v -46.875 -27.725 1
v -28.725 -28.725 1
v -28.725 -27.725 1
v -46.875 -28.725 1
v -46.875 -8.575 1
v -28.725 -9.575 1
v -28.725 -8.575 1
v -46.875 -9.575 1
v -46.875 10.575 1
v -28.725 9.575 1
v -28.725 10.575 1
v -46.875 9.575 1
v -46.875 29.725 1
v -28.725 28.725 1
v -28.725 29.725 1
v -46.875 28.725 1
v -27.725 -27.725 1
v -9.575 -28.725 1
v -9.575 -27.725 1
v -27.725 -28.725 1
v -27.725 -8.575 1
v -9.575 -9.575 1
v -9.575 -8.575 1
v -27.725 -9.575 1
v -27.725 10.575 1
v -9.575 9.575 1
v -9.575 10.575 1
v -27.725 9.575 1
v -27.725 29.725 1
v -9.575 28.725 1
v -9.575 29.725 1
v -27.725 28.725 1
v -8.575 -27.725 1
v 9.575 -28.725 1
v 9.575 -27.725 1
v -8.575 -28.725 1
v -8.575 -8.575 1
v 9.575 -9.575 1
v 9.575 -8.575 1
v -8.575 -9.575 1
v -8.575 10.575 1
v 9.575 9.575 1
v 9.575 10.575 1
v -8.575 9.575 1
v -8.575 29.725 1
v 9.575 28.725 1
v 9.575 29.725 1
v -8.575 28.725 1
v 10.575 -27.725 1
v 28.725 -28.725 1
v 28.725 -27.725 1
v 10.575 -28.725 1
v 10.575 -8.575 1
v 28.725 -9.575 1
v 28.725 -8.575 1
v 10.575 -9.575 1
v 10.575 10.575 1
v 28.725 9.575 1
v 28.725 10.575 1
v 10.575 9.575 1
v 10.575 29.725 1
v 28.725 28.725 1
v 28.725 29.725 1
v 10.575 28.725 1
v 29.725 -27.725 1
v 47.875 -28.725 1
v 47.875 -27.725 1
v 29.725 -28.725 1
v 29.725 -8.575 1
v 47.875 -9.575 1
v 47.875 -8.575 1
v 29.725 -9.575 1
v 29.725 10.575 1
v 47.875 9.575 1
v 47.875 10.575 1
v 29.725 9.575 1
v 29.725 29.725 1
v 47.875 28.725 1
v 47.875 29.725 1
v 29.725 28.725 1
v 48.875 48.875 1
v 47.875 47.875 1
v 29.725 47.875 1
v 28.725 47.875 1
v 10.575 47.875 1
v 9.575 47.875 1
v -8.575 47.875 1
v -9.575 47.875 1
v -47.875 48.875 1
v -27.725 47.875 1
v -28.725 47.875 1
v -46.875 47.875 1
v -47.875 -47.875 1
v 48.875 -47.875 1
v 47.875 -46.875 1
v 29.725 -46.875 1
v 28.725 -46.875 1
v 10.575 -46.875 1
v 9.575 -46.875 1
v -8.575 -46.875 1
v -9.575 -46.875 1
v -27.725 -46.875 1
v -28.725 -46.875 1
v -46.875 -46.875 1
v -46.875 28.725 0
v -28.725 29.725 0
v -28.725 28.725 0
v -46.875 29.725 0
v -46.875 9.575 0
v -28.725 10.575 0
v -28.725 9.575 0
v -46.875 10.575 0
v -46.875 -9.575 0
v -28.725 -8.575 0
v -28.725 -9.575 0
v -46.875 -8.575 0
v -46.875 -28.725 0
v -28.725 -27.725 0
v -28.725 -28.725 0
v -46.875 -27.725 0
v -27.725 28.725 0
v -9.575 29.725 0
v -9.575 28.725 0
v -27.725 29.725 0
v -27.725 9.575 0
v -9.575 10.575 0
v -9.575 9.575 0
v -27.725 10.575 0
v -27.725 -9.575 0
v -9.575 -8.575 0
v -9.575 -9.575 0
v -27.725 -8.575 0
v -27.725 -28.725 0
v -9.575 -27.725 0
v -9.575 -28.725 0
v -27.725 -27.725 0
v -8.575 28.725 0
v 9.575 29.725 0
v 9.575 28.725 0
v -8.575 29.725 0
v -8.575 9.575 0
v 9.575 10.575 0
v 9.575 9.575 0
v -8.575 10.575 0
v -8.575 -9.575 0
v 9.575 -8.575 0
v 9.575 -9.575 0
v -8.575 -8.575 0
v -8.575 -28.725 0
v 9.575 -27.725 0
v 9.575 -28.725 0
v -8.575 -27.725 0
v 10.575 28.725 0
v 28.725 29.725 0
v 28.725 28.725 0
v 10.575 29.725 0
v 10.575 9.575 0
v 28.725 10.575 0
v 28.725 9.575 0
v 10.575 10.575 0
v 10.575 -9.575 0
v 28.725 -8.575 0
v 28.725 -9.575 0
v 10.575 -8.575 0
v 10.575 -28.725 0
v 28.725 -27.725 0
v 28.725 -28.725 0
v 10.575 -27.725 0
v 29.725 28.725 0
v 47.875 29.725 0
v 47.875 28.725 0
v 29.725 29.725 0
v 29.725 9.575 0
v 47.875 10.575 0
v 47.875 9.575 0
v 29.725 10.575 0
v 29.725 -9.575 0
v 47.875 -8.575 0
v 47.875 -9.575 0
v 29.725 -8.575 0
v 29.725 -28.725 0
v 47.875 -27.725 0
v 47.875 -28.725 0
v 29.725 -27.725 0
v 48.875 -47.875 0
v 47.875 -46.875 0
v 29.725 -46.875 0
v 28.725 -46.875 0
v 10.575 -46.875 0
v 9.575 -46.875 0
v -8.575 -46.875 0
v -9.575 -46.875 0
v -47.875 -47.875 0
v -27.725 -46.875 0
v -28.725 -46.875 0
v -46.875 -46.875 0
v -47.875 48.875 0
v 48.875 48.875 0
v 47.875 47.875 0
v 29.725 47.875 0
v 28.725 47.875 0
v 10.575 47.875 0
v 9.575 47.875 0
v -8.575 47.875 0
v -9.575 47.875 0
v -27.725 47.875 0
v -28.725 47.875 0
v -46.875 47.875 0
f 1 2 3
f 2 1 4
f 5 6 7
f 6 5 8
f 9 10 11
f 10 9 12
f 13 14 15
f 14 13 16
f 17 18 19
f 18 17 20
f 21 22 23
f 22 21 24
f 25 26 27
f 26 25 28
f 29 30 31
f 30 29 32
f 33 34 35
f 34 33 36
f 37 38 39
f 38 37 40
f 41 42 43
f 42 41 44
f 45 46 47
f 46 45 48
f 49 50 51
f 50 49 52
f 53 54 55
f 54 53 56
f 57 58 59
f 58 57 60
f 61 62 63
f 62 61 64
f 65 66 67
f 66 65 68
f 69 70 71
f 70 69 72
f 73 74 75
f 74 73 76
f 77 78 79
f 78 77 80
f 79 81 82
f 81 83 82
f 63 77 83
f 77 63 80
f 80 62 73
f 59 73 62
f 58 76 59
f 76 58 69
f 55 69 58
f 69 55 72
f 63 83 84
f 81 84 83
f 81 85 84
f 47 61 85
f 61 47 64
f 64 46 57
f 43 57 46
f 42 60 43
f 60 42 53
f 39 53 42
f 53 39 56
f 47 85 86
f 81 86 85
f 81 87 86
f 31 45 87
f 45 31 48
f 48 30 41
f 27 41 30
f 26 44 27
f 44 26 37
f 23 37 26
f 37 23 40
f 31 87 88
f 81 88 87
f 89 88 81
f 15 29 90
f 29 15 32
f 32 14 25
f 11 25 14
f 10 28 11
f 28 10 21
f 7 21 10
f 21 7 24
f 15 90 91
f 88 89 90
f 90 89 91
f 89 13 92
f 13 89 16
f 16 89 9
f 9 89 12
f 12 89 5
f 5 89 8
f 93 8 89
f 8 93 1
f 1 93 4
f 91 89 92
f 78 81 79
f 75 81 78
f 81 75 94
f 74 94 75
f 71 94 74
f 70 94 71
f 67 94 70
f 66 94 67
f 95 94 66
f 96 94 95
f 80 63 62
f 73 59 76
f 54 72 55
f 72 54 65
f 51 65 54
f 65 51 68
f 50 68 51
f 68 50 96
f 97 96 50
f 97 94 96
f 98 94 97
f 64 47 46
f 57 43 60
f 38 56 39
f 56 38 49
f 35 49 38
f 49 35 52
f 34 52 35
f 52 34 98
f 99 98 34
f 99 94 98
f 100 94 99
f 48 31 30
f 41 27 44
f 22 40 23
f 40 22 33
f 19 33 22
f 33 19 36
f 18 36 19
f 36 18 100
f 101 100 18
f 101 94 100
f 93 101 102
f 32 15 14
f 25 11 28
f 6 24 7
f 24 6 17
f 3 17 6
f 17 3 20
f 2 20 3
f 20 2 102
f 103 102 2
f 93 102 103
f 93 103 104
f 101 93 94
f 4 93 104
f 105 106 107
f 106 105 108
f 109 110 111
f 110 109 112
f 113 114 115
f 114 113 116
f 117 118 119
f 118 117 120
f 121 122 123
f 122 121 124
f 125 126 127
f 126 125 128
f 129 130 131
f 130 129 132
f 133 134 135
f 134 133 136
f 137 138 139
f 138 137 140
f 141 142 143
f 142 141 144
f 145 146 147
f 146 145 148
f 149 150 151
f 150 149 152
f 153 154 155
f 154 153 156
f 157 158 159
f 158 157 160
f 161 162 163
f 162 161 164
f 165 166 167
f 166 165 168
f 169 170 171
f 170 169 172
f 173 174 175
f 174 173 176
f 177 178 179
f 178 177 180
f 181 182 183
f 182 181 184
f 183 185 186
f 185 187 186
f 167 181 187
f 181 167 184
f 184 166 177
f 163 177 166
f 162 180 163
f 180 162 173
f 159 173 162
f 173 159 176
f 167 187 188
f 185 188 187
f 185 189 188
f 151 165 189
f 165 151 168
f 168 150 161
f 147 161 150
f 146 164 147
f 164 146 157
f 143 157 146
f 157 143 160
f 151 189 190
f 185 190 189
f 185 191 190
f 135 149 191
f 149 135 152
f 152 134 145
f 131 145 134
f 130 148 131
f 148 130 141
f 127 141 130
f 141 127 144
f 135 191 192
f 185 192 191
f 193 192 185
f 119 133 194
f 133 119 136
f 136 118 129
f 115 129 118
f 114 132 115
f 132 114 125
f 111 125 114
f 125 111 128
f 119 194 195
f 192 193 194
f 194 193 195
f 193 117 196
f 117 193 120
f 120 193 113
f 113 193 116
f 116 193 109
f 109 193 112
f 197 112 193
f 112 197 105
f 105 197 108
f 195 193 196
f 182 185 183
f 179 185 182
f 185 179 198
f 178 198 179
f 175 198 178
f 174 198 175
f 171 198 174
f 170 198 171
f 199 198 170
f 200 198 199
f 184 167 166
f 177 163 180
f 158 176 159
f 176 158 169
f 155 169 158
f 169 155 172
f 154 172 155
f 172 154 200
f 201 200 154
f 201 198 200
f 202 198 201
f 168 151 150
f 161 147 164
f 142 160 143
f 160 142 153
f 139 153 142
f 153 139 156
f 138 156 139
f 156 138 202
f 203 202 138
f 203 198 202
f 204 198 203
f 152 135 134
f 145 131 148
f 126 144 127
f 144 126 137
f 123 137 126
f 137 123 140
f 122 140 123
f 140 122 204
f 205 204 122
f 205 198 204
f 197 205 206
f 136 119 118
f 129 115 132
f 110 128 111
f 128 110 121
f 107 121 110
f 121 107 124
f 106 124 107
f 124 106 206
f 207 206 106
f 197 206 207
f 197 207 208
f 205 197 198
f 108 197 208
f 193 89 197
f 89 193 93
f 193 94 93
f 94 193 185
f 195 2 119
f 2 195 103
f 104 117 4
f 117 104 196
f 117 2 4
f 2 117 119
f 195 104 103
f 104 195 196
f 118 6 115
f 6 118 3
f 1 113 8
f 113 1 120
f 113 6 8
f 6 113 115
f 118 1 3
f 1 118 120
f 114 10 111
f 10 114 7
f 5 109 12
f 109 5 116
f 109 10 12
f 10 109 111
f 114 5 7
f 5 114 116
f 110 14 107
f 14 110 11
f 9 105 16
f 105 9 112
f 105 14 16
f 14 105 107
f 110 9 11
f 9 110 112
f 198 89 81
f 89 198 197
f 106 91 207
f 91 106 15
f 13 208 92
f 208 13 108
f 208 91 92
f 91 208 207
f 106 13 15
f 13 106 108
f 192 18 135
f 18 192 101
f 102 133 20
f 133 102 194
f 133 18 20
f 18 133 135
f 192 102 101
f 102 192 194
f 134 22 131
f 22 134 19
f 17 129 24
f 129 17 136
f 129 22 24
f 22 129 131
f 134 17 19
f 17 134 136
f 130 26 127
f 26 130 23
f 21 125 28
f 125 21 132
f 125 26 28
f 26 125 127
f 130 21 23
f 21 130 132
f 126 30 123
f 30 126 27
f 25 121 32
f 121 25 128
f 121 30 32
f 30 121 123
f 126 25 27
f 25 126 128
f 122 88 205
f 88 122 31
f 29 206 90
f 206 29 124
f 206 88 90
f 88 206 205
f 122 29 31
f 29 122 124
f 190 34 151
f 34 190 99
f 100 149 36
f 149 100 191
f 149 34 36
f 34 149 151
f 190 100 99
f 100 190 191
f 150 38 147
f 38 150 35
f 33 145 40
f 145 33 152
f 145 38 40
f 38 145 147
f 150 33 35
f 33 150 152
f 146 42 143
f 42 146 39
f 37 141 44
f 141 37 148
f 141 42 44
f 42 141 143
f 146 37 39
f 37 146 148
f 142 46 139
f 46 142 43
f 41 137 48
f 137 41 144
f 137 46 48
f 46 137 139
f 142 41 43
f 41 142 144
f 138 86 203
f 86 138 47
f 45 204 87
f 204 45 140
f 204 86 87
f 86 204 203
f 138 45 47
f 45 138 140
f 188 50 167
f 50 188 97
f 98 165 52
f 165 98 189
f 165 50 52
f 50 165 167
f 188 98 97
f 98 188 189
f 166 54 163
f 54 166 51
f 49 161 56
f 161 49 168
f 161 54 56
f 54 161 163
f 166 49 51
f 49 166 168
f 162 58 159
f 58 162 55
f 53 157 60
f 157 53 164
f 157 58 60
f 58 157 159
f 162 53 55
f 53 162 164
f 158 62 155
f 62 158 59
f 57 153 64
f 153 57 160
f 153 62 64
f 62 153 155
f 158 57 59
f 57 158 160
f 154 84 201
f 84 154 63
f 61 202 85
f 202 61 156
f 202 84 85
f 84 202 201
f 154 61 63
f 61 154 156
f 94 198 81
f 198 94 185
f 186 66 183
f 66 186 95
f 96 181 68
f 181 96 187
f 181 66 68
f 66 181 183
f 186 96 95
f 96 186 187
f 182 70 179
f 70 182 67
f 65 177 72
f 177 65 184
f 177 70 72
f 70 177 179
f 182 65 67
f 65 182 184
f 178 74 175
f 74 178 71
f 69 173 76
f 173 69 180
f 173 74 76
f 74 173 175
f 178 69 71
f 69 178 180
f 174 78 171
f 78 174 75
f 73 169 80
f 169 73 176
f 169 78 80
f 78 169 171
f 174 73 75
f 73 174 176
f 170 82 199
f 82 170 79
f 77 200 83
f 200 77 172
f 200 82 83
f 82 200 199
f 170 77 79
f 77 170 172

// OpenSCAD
spacing = 19.15;
diameter = 1;
grid = 5;

translate([-spacing * (grid / 2), -spacing * (grid / 2), 0])
  {
    for (x = [0:(grid - 1)]) {
      for (y = [0:(grid - 1)]) {
        translate([spacing * x, spacing * y, 0])
          square();
      }
    }
  }

module square() {
  difference() {
    cube([spacing + diameter, spacing + diameter, diameter]);
    translate([diameter, diameter, -0.1])
      cube([spacing - diameter, spacing - diameter, diameter + 0.2]);
  }
}
